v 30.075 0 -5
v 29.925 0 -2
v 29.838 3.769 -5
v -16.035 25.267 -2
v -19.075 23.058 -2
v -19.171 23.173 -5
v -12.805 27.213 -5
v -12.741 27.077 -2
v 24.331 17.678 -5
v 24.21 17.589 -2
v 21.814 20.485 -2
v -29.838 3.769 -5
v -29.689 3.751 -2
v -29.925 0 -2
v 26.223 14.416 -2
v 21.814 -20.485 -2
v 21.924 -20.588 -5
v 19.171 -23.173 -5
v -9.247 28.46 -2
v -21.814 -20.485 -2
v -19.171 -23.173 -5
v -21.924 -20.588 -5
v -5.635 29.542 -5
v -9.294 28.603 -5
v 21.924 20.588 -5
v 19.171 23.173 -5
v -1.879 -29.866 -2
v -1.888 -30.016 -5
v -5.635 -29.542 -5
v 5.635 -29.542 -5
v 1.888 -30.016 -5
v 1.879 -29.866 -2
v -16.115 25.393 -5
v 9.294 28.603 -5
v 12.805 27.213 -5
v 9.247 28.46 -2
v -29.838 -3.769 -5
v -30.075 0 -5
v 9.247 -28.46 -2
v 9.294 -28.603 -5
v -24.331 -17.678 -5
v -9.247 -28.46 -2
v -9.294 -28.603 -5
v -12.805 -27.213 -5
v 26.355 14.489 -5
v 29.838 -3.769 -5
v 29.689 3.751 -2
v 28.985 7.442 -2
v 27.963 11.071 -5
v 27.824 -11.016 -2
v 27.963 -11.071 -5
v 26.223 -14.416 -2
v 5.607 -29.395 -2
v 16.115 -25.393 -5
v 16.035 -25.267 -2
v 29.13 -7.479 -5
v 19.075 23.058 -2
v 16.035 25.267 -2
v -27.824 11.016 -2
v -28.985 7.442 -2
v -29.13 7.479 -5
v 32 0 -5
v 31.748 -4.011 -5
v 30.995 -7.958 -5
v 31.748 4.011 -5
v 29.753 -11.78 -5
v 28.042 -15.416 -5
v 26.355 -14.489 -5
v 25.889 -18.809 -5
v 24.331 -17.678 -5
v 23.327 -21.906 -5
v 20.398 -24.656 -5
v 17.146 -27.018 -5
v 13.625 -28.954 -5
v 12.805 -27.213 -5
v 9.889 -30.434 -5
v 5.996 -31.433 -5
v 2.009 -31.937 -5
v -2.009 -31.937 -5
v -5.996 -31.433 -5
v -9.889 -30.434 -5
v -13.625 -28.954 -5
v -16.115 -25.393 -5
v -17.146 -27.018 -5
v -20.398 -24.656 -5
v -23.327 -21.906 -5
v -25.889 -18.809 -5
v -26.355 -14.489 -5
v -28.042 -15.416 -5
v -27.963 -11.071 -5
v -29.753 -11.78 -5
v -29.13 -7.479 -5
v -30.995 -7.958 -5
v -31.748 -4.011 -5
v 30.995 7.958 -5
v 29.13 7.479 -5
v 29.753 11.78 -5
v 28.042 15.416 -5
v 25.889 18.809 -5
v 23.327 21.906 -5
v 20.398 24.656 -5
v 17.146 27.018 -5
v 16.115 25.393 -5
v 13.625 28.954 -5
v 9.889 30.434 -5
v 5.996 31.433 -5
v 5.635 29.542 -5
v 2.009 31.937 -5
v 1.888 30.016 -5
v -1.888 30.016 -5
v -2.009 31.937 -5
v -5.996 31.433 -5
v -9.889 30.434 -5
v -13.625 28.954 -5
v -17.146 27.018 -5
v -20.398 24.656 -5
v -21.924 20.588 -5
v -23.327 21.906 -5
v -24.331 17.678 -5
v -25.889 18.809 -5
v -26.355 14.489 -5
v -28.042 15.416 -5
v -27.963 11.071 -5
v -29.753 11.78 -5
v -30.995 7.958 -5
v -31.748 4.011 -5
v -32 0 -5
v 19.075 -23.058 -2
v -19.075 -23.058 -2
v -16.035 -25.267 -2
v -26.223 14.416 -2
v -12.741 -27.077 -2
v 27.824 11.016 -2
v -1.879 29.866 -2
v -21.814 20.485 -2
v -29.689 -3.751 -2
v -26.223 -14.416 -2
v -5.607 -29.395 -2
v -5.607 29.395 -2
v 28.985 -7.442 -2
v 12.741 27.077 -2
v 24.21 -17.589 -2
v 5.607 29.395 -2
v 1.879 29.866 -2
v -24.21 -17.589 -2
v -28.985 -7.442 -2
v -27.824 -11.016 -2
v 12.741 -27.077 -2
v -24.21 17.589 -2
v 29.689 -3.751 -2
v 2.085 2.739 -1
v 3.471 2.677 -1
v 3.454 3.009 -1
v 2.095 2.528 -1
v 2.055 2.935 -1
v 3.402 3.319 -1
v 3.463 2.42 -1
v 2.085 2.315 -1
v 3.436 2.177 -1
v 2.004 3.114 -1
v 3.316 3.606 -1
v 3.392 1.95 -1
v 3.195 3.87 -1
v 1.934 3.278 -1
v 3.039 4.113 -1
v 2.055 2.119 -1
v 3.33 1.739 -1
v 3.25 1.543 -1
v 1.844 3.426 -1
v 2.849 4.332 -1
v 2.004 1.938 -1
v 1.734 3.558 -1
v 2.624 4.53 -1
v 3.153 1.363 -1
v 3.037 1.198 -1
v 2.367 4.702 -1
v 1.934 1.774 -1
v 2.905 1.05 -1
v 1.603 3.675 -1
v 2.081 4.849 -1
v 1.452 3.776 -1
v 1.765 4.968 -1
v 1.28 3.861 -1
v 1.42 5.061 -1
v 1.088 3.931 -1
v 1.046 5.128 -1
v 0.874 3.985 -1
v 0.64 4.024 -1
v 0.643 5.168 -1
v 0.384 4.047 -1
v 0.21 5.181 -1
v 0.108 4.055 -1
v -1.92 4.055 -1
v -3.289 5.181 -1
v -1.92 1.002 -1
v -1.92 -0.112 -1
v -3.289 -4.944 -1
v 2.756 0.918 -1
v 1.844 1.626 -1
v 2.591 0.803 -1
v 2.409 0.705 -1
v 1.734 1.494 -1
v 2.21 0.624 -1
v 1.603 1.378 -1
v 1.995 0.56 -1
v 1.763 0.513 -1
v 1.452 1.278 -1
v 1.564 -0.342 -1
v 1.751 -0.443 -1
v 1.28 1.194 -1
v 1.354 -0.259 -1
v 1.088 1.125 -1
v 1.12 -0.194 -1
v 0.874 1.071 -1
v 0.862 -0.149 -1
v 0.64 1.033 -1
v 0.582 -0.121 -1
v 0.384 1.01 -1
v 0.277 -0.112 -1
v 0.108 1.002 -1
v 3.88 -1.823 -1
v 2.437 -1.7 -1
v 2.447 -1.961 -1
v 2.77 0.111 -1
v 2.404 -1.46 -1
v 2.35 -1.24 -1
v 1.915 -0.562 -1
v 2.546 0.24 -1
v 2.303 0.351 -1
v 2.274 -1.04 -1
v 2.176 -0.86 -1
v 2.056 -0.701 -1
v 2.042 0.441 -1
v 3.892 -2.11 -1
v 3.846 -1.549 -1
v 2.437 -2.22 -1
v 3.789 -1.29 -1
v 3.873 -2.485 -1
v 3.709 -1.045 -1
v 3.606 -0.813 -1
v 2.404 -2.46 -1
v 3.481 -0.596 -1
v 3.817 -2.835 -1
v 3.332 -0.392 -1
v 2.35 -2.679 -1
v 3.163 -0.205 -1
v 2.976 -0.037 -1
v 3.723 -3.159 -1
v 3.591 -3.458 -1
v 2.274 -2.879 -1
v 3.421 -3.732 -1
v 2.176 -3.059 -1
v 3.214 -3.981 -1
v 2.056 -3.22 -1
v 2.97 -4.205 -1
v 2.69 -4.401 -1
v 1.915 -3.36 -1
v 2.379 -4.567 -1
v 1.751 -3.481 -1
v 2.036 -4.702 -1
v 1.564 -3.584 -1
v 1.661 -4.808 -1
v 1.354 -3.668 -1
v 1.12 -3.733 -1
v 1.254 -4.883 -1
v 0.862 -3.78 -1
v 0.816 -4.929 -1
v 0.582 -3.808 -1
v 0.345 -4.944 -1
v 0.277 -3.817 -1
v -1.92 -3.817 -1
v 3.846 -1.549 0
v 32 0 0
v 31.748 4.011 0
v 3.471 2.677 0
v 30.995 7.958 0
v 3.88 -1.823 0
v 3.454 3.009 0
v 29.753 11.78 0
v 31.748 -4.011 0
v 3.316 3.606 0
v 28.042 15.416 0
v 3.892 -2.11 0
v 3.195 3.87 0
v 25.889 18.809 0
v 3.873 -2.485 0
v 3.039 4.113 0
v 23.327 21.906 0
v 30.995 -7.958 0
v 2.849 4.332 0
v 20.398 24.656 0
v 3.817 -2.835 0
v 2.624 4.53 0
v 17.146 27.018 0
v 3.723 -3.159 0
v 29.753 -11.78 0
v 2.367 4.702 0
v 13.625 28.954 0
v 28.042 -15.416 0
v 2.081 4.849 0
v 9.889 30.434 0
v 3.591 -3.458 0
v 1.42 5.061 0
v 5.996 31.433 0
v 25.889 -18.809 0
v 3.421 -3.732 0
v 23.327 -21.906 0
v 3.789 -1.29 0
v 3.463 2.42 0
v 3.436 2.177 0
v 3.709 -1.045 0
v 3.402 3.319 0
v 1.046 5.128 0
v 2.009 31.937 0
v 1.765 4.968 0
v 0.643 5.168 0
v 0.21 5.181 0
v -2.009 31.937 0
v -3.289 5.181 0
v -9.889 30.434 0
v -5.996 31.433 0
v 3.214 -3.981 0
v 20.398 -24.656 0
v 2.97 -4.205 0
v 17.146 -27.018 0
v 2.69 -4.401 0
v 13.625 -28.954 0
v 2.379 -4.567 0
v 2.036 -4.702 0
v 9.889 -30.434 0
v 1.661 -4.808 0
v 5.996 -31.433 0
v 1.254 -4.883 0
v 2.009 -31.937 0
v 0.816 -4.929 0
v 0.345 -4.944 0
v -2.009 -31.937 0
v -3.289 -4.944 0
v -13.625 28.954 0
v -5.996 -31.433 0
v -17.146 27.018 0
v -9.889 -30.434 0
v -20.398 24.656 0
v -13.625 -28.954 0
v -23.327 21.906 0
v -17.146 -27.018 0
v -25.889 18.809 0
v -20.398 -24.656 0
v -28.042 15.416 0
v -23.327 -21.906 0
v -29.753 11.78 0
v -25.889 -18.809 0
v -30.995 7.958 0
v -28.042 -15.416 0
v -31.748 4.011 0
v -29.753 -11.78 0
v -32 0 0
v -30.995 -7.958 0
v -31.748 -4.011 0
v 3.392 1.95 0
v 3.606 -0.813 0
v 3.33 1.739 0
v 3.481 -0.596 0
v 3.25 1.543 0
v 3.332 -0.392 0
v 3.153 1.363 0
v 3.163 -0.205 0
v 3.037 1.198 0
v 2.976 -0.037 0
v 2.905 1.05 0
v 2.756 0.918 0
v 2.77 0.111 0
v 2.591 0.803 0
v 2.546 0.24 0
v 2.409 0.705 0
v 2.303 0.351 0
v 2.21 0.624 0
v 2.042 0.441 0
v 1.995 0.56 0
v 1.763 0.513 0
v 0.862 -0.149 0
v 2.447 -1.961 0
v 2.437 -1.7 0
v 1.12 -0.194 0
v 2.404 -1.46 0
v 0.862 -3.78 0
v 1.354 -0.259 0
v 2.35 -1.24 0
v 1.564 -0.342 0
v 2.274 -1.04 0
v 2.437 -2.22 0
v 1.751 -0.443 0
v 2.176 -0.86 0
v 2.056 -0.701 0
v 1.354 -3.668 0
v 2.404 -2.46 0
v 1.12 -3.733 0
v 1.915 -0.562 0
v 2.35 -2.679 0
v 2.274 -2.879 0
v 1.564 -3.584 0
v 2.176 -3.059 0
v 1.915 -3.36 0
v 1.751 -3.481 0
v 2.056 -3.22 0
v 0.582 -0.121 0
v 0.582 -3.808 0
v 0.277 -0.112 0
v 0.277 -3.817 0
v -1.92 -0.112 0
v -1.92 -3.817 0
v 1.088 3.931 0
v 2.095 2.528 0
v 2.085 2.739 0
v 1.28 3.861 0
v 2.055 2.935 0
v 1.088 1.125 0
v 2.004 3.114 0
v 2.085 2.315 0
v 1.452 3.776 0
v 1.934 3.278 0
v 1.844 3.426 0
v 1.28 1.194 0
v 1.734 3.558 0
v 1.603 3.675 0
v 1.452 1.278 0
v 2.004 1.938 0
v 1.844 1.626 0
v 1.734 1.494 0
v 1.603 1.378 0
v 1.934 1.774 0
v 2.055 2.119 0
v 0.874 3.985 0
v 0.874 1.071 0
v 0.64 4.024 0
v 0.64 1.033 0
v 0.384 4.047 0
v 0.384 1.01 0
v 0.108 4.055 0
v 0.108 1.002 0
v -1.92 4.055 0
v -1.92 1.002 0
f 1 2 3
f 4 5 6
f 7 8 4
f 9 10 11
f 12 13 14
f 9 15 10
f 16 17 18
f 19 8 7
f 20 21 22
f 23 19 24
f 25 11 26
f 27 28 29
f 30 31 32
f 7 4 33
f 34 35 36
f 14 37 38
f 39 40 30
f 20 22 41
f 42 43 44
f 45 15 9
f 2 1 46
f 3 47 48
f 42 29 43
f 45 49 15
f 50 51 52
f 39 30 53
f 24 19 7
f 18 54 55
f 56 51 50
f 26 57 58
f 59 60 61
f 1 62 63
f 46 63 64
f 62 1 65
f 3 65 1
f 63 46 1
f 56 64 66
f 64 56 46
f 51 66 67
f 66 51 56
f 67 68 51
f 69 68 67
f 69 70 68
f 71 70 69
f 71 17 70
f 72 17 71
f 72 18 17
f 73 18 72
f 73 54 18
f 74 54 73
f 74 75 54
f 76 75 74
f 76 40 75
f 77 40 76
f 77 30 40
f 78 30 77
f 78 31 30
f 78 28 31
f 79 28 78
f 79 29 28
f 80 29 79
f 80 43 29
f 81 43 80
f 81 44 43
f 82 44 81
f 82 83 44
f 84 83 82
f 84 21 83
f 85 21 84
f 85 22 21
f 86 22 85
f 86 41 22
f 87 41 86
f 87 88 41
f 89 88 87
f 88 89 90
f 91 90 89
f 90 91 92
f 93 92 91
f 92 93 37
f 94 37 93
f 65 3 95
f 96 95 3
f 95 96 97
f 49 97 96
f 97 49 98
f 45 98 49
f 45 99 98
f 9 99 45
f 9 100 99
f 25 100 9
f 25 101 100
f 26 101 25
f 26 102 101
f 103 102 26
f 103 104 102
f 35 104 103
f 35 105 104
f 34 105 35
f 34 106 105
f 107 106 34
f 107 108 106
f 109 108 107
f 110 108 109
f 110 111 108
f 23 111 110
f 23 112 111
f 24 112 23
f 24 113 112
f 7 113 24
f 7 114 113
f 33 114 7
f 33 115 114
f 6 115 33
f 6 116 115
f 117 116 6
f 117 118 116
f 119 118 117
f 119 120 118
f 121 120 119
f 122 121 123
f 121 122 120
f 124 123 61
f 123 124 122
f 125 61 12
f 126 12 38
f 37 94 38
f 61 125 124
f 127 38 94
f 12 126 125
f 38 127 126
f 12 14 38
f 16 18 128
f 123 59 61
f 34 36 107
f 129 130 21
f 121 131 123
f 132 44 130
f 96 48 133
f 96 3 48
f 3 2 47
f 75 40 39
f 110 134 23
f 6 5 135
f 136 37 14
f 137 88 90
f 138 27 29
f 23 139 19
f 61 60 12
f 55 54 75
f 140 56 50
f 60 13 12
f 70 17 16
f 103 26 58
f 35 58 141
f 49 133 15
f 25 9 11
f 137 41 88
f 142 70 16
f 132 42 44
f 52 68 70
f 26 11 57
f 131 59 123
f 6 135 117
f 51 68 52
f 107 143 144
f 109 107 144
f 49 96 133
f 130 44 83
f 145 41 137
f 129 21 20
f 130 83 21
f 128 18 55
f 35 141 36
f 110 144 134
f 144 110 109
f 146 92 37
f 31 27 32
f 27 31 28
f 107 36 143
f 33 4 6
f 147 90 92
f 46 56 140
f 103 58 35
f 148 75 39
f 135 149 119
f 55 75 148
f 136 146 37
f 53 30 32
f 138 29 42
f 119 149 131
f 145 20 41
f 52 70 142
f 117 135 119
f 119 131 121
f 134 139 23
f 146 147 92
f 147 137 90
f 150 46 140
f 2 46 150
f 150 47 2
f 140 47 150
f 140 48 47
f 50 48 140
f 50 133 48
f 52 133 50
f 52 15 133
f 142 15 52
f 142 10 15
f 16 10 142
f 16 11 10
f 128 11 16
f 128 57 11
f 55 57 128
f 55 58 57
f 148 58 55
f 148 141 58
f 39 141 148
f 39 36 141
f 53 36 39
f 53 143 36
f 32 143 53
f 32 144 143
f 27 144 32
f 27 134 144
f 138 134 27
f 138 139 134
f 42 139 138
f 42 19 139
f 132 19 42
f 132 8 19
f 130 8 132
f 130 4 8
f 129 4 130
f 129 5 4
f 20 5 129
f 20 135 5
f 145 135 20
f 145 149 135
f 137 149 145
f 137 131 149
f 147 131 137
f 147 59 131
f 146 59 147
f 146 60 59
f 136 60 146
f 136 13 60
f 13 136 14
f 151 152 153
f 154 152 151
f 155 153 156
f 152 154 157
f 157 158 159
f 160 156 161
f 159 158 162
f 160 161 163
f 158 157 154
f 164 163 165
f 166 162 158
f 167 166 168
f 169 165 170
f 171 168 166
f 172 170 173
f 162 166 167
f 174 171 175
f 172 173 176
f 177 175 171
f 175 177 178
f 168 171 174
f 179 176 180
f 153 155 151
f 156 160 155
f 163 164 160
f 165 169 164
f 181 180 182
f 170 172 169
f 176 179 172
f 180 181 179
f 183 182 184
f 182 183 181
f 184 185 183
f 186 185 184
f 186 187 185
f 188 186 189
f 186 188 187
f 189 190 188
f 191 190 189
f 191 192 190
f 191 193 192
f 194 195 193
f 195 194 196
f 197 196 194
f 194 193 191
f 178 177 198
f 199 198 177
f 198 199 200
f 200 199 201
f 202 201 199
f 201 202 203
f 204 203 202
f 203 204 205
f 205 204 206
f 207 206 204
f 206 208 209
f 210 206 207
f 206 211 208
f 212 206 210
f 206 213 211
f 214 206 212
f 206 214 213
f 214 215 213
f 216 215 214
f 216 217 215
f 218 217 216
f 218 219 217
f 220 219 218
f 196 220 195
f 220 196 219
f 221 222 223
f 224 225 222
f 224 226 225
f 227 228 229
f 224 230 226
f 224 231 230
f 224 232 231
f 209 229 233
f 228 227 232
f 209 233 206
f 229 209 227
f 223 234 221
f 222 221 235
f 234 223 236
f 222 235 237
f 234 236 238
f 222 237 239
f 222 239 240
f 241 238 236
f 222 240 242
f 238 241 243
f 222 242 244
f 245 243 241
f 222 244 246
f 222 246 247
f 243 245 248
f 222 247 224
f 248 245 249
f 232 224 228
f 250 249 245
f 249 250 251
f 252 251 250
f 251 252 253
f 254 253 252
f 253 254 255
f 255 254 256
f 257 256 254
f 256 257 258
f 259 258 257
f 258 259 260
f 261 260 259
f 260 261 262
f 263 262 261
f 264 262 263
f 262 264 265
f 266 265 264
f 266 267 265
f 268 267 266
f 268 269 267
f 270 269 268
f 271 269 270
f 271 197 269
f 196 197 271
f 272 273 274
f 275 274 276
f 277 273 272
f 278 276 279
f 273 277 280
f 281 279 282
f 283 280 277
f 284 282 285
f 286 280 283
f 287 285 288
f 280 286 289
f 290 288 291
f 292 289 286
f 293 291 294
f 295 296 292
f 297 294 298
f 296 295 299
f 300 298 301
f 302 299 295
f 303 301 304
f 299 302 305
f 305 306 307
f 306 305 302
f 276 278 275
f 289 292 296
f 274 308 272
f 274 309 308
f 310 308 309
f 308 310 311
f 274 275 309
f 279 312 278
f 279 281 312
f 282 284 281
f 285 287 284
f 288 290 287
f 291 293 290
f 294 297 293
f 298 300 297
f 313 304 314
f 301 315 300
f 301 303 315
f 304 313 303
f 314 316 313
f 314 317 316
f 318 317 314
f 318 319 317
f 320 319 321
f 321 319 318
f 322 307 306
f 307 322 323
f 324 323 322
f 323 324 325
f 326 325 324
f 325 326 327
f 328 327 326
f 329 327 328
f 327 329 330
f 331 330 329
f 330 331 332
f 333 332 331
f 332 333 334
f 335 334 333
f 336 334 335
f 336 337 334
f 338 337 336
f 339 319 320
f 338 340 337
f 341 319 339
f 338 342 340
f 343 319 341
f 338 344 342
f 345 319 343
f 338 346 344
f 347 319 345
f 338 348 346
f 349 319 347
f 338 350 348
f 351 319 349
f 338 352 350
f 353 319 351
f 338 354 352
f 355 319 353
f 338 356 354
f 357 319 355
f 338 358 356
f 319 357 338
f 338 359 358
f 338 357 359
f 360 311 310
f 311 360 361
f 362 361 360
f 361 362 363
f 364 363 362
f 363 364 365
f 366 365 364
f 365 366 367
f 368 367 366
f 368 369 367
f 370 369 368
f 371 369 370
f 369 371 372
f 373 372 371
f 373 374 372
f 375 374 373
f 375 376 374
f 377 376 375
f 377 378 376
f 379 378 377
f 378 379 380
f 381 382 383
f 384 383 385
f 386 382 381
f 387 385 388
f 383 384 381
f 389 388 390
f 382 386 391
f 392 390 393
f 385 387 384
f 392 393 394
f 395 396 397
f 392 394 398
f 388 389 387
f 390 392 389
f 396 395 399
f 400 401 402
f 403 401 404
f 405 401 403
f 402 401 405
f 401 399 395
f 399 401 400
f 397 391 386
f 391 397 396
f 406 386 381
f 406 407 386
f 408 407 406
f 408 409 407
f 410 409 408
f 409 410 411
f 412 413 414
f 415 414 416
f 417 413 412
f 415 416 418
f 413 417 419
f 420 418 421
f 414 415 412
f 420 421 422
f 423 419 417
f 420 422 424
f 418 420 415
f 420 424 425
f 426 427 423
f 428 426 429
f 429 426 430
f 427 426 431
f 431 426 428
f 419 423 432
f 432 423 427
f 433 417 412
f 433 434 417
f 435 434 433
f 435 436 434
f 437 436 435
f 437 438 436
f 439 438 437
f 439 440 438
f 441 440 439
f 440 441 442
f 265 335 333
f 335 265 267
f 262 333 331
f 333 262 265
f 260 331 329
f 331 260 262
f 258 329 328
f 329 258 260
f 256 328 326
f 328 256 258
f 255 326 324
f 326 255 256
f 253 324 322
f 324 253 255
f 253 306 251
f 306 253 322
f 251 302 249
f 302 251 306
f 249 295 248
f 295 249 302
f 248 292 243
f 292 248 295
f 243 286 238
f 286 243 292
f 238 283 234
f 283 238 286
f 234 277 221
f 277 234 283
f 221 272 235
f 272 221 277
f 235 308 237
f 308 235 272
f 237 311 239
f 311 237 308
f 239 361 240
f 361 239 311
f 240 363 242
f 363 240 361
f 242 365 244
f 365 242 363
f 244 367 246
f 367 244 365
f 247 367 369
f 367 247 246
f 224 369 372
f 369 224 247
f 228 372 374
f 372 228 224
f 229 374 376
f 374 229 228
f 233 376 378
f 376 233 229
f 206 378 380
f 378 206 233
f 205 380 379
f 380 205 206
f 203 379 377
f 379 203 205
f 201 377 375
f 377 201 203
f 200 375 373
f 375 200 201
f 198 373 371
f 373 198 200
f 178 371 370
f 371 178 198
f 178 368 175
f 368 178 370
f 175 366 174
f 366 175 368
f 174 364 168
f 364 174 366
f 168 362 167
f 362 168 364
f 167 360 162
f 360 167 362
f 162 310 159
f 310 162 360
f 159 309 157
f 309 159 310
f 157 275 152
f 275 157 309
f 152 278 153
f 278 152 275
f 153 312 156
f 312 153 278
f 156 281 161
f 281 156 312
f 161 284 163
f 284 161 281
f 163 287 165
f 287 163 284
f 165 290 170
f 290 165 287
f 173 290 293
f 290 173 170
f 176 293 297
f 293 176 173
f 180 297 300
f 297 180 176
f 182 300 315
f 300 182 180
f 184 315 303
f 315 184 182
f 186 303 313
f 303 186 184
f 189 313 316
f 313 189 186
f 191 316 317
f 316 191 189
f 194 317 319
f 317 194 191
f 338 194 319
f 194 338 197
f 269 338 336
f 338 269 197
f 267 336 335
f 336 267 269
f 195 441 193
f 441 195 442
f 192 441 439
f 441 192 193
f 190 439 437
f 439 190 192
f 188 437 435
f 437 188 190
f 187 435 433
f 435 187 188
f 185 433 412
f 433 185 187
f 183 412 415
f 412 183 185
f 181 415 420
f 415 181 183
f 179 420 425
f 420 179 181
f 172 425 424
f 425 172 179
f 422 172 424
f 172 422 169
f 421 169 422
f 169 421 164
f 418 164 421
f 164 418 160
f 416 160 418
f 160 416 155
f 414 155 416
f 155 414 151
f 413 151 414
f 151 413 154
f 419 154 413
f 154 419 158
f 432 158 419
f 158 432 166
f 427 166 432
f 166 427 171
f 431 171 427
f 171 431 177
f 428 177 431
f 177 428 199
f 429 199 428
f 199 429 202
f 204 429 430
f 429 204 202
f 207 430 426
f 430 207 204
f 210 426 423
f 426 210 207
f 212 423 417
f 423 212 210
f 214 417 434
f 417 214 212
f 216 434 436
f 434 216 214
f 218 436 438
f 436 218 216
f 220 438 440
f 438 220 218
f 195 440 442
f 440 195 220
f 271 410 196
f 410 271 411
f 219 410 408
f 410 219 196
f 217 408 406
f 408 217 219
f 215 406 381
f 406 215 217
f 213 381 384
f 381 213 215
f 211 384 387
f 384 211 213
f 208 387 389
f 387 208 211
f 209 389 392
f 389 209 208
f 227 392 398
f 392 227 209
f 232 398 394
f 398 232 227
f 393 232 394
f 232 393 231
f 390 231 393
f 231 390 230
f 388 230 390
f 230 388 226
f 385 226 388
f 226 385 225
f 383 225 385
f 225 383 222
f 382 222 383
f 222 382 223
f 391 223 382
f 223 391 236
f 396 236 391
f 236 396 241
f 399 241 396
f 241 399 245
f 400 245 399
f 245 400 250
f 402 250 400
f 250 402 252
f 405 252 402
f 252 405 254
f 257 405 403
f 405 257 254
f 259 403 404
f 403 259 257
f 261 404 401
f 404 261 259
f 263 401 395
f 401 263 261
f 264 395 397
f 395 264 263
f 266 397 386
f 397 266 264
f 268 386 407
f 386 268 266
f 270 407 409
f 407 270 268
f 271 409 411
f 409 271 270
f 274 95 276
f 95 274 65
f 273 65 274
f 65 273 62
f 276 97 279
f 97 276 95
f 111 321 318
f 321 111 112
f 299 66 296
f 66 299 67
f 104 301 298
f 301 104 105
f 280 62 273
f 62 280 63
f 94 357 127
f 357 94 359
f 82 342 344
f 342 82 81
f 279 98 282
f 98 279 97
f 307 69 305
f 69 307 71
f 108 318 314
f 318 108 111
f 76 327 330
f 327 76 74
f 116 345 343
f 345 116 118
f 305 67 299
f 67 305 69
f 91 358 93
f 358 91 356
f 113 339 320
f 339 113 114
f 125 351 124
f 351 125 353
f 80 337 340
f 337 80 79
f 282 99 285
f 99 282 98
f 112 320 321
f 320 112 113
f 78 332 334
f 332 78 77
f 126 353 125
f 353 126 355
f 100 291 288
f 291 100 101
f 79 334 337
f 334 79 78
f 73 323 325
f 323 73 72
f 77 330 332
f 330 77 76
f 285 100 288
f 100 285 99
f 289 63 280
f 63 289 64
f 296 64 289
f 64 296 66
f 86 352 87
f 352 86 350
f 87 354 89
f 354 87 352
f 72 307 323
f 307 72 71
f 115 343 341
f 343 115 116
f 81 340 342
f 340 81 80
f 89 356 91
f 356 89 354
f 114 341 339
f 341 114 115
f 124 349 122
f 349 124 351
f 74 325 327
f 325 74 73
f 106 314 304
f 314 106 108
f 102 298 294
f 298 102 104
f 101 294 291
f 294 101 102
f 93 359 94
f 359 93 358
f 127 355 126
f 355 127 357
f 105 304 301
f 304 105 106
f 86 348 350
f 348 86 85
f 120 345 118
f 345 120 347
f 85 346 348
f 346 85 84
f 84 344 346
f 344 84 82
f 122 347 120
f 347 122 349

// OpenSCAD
$fn = 50;

difference() {
	union() {
		translate(v = [0, 0, -5.0]) {
			cylinder(h = 5, r = 32.0);
		}
	}
	union() {
		#translate(v = [0, 0, -5.0]) {
			cylinder(h = 3, r1 = 30.075, r2 = 29.925);
		}
		translate(v = [0, 0, -1]) {
			linear_extrude(height = 1) {
				text(font = "Impact", halign = "center", size = 10, text = "B", valign = "center");
			}
		}
	}
}
